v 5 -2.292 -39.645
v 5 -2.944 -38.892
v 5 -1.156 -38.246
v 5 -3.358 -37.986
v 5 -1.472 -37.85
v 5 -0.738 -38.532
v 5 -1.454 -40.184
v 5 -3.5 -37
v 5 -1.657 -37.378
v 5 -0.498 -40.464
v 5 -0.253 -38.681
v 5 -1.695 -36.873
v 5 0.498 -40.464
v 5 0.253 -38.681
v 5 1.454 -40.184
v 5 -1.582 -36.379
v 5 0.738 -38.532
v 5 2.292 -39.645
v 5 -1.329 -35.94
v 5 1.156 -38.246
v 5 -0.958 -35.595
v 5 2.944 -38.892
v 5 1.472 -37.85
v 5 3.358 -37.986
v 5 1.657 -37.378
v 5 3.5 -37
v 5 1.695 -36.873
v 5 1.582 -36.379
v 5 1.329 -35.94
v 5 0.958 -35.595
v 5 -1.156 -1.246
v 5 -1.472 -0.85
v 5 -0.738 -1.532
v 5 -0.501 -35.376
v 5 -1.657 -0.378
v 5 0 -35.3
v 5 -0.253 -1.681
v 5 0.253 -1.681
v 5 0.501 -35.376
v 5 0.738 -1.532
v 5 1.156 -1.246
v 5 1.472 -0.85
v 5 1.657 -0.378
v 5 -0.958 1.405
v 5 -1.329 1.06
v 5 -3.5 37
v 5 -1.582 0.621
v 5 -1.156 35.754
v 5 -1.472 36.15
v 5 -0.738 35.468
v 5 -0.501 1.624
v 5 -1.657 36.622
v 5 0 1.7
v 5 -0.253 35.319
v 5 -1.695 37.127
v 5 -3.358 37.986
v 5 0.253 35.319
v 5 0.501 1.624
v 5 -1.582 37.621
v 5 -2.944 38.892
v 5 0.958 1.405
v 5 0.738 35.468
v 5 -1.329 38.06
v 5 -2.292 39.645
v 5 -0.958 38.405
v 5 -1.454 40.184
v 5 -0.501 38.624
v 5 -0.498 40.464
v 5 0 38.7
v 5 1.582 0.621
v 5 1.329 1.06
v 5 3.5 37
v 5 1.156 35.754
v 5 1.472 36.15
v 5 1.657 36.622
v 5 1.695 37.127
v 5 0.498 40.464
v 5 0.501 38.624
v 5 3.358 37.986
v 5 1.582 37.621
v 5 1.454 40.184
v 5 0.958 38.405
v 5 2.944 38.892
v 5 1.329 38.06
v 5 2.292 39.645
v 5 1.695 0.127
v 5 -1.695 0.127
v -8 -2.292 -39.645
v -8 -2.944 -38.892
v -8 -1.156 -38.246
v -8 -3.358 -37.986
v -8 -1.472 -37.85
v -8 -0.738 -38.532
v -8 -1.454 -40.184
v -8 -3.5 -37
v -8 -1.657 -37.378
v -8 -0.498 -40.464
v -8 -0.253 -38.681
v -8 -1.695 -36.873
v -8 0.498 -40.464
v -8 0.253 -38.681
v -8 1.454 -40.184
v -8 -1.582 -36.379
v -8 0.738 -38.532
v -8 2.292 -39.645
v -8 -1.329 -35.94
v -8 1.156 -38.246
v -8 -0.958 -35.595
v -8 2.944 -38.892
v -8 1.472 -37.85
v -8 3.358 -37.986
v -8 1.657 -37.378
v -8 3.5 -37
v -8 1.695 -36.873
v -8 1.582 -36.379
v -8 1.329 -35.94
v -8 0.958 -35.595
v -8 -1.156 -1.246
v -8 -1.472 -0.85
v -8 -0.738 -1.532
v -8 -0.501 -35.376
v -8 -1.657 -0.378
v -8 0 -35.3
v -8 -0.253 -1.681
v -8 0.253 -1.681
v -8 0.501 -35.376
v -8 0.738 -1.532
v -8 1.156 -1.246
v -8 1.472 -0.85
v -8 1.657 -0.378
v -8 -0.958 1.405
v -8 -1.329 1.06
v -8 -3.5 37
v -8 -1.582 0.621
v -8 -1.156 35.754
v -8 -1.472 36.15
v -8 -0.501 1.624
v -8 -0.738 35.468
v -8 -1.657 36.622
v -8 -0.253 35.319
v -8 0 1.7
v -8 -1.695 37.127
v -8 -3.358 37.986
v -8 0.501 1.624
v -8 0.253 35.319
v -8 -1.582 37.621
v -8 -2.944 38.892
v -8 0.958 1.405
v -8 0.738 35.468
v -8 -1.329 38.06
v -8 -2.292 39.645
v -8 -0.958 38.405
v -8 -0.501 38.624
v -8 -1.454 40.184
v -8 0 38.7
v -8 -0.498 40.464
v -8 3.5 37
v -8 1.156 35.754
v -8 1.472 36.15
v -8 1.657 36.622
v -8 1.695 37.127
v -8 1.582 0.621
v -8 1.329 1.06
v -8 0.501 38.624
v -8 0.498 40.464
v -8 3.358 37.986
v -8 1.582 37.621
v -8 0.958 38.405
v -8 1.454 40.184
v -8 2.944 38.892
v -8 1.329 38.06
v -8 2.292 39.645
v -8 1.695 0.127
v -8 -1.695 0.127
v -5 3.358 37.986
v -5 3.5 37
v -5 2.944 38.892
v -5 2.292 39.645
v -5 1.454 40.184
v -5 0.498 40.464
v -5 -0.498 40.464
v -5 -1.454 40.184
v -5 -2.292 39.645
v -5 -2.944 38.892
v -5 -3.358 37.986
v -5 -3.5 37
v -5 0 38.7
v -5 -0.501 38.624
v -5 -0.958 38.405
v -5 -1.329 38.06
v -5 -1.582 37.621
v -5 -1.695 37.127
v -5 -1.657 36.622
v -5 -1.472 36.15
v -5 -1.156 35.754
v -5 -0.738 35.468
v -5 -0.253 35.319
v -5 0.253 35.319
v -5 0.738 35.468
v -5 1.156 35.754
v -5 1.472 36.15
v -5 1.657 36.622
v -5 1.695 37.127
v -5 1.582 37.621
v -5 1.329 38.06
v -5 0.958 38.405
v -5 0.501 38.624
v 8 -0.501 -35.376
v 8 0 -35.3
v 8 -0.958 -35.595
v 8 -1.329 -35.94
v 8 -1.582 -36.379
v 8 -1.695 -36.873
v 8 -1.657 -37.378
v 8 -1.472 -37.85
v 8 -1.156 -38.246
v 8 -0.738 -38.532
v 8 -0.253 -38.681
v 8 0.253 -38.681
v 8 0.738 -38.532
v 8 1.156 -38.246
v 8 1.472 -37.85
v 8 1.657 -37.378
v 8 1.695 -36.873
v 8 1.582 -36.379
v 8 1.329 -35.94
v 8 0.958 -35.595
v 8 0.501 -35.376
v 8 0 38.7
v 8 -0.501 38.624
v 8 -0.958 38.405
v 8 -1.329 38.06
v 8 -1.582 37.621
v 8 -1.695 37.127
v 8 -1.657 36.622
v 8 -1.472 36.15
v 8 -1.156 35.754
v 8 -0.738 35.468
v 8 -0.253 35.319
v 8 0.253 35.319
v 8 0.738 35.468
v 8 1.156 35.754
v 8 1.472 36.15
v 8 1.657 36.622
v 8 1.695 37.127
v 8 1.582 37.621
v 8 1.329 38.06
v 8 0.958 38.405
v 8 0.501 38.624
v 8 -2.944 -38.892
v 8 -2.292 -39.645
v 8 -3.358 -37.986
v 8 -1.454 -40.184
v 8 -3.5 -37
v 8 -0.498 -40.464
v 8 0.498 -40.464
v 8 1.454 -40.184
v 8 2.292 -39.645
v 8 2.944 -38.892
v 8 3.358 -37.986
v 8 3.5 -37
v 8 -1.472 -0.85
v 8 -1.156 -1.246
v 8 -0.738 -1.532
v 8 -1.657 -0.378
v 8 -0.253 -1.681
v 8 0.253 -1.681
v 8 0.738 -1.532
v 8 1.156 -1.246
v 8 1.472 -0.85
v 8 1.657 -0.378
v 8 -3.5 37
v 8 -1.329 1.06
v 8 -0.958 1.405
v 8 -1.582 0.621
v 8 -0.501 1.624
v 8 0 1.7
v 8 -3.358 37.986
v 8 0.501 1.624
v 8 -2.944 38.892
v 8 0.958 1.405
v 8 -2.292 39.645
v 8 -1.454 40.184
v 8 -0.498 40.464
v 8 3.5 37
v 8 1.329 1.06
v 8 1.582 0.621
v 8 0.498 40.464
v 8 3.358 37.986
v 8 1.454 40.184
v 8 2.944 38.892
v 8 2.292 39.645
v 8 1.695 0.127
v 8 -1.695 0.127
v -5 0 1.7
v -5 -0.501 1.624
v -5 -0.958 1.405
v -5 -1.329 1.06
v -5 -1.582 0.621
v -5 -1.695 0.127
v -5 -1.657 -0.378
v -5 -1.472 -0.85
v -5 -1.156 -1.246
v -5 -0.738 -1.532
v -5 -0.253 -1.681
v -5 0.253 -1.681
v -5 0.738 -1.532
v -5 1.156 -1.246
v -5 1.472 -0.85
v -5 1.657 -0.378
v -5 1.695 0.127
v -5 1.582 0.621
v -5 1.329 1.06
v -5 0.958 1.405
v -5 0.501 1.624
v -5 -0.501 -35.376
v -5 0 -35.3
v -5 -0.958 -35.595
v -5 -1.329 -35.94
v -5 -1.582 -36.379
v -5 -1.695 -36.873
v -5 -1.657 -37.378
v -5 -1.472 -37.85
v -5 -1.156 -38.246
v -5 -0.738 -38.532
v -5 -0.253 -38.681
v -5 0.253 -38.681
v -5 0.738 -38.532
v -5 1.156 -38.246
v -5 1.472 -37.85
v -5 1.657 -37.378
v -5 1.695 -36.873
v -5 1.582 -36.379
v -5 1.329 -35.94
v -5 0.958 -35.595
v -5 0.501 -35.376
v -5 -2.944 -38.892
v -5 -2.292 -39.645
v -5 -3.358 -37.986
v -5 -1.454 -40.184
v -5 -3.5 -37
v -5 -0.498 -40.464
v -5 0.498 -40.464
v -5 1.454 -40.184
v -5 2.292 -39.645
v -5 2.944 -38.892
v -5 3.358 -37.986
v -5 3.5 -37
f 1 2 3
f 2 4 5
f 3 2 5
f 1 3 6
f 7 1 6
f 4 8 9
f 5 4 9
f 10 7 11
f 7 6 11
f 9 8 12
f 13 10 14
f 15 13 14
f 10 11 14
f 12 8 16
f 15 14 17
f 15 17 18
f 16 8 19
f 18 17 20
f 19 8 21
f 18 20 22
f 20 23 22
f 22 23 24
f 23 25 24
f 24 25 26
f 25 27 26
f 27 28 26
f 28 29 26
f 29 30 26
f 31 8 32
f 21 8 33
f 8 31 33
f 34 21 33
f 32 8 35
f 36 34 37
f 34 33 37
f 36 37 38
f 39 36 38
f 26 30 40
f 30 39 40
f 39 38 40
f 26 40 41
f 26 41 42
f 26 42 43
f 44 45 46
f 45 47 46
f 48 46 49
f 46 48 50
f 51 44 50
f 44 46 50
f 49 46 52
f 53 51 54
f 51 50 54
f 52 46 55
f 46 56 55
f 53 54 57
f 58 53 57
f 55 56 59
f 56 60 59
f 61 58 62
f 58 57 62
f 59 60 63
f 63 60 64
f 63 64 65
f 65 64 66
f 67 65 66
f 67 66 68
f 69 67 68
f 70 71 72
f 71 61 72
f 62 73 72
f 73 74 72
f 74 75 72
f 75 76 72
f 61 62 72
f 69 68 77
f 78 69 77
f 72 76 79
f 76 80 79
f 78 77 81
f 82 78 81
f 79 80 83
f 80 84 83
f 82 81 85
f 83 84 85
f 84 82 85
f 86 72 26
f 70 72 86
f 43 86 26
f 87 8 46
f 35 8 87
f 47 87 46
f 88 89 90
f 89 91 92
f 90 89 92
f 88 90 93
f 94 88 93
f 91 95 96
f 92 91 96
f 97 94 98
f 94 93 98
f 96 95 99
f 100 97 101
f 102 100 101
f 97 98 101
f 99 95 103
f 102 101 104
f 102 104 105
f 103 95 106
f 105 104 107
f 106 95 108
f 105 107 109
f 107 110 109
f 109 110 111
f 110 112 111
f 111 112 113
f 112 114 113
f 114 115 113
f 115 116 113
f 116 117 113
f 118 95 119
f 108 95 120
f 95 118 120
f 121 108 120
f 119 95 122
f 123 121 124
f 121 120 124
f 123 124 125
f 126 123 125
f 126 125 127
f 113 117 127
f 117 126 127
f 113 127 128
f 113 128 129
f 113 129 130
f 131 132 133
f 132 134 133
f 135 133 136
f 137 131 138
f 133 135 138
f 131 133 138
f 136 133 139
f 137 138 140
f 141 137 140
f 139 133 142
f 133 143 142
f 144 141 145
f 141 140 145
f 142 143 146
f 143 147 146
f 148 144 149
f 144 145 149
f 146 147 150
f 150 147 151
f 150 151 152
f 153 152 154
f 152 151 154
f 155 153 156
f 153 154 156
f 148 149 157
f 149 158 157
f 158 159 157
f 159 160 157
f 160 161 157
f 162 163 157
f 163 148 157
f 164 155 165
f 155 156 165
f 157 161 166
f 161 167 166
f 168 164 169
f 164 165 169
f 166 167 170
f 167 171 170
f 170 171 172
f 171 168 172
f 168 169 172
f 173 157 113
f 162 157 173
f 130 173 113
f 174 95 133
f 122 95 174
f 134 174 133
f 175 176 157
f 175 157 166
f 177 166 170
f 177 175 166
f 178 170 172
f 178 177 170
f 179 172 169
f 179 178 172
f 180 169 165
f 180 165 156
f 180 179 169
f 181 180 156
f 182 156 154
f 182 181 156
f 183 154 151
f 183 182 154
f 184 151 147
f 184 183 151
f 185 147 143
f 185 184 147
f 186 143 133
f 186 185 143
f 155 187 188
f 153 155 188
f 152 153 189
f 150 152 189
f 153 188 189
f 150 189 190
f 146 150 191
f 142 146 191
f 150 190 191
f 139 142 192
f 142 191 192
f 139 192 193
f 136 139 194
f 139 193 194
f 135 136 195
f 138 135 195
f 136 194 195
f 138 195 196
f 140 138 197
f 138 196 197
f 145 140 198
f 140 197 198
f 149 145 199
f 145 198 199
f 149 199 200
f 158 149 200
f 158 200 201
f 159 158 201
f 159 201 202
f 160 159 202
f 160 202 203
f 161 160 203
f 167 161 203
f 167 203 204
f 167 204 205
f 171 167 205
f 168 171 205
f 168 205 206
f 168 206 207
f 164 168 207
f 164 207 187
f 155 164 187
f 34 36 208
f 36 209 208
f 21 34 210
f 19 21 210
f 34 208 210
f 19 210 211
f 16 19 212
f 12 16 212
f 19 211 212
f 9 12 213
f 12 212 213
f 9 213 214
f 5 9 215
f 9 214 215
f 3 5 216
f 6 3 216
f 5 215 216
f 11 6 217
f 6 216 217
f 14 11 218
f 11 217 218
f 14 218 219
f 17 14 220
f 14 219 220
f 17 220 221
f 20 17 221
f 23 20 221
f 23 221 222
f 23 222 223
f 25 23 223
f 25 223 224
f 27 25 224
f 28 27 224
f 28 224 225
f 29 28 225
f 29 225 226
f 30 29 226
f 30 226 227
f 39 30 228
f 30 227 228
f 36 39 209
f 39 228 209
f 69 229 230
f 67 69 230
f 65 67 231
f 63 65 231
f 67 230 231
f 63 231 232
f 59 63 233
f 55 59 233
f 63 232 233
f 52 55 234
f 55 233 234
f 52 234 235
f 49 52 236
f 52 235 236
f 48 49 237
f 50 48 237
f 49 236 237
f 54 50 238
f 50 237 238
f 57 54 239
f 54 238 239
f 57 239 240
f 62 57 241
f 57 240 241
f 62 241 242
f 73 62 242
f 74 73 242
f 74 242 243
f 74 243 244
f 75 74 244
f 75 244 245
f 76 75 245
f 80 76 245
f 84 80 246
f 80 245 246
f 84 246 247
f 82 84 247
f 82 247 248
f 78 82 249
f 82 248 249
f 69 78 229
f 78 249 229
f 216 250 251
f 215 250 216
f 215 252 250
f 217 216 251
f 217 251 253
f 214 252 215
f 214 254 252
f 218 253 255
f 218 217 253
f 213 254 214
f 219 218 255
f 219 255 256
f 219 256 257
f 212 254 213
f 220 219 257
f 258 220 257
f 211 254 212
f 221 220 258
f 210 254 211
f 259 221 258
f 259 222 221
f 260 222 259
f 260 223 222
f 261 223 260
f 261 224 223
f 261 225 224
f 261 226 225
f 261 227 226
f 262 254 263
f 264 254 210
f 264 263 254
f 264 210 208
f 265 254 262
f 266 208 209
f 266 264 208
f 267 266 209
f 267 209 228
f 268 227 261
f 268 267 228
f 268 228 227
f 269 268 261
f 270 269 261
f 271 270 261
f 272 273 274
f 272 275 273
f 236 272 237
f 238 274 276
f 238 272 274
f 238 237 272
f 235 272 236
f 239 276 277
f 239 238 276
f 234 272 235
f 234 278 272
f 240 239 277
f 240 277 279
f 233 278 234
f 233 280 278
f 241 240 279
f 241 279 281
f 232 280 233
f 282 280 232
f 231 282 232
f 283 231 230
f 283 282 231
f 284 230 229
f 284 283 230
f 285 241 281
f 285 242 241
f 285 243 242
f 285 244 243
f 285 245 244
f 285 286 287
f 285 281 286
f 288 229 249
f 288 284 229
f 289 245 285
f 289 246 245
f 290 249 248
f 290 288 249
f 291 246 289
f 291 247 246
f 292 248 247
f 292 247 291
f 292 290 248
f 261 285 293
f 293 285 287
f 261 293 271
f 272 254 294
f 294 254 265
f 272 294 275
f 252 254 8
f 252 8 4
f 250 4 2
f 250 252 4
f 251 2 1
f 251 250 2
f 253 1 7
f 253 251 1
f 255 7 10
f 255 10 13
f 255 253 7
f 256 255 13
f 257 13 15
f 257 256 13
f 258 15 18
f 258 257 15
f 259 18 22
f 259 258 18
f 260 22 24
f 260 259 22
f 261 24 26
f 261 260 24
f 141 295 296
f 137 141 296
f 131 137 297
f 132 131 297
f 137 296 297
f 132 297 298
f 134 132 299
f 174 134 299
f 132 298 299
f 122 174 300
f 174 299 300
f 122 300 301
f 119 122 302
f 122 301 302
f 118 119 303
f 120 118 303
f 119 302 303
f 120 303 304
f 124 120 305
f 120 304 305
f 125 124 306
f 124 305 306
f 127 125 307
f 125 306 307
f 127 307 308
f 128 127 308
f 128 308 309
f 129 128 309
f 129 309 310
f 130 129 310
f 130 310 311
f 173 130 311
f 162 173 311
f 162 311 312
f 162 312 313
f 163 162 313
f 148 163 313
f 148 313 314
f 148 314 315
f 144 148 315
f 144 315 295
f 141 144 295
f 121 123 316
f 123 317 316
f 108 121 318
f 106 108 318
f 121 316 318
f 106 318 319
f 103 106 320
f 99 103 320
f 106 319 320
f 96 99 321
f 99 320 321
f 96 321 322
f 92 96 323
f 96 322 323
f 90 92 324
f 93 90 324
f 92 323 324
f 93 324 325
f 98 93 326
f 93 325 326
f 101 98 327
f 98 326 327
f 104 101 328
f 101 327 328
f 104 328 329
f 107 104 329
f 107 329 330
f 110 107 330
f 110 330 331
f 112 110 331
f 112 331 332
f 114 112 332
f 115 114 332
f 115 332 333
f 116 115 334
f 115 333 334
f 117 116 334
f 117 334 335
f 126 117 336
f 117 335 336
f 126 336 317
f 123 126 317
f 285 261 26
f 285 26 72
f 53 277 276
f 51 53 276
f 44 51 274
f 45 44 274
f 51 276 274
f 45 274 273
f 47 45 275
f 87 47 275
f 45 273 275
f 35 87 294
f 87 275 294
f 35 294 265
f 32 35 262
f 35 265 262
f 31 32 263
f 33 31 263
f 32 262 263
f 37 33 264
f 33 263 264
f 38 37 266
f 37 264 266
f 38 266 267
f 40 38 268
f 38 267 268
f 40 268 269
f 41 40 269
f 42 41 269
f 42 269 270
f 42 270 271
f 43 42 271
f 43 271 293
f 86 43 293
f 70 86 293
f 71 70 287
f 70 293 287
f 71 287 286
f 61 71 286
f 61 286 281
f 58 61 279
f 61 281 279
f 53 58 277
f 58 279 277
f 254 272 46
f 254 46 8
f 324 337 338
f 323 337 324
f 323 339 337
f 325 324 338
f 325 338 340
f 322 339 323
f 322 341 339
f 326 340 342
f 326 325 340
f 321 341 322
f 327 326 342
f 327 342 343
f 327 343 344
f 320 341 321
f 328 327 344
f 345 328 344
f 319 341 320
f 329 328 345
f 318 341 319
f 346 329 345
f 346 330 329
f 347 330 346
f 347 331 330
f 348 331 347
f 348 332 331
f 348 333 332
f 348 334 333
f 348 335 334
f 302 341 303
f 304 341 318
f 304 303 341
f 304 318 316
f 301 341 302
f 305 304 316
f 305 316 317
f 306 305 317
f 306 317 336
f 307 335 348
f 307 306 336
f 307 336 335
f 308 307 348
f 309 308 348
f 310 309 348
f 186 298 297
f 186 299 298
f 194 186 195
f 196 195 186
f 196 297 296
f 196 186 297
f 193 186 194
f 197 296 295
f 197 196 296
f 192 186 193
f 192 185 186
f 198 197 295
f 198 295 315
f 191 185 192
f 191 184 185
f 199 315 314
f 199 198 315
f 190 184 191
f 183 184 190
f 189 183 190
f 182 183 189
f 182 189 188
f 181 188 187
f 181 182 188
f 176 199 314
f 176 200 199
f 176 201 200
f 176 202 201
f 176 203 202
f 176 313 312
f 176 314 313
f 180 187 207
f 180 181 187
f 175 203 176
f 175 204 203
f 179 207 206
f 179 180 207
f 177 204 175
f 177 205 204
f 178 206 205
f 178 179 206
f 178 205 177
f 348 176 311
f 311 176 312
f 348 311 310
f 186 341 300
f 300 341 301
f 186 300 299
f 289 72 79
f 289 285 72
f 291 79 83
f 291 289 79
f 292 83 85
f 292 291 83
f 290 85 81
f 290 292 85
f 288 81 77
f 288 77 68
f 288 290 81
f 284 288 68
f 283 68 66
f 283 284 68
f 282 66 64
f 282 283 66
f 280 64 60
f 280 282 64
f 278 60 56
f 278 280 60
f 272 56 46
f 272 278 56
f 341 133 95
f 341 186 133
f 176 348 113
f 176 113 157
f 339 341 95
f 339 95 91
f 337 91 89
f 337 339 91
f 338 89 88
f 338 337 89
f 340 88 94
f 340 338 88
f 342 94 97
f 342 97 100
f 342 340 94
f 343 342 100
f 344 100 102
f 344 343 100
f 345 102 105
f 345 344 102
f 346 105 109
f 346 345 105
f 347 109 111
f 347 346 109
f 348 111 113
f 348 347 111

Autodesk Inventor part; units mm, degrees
ref_plane "YZ Plane" through (0, 0, 0) normal (1, 0, 0) x (0, 1, 0)
ref_plane "XZ Plane" through (0, 0, 0) normal (0, 1, 0) x (-1, 0, 0)
ref_plane "XY Plane" through (0, 0, 0) normal (0, 0, 1) x (1, 0, 0)
sketch "Sketch1" plane through (0, 0, 0) normal (1, 0, 0) x (0, 1, 0)
  line L0 (0, 37) -> (0, -37) construction
  line L1 (-3.5, 37) -> (-3.5, -37)
  line L2 (3.5, -37) -> (3.5, 37)
  arc A0 (3.5, 37) -> (-3.5, 37) centre (0, 37) ccw
  arc A1 (-3.5, -37) -> (3.5, -37) centre (0, -37) ccw
  circle A2 centre (0, -37) radius 1.5
  circle A3 centre (0, 0) radius 1.5
  circle A4 centre (0, 37) radius 1.5
  point P0 (0, 40.5)
  point P1 (0, -40.5)
  dimension "d14" = 7
  dimension "d15" = 81
  dimension "d16" = 3
extrude "Extrusión3" add sketch "Sketch1" along normal mid plane 16 contours A0 L2 A1 L1 | A2 | A3 | A4
extrude "Extrusión4" cut sketch "Sketch1" along normal mid plane 10 contours A0 L2 A1 L1 | A3
sketch "Boceto2" plane through (-8, 0, 0) normal (-1, 0, 0) x (0, 0, 1)
  circle A0 centre (37, 0) radius 1.5 projected
  circle A1 centre (-37, 0) radius 1.5 projected
  point P0 (0, 0)
  point P1 (0, 0)
hole "Agujero1" at (-8, 0, 37) at (-8, 0, -37) at (-8, 0, 0) direction (1, 0, 0) diameter 3.4 end through all clearance for "Tornillo de cabeza plana avellanada ISO 2009/7046" size "M3" standard "ISO"
equation "\"d19\" = Dedos"
equation "\"Dedos\" = 10"
properties part number "Corredera I" material "Aluminio 6061"
